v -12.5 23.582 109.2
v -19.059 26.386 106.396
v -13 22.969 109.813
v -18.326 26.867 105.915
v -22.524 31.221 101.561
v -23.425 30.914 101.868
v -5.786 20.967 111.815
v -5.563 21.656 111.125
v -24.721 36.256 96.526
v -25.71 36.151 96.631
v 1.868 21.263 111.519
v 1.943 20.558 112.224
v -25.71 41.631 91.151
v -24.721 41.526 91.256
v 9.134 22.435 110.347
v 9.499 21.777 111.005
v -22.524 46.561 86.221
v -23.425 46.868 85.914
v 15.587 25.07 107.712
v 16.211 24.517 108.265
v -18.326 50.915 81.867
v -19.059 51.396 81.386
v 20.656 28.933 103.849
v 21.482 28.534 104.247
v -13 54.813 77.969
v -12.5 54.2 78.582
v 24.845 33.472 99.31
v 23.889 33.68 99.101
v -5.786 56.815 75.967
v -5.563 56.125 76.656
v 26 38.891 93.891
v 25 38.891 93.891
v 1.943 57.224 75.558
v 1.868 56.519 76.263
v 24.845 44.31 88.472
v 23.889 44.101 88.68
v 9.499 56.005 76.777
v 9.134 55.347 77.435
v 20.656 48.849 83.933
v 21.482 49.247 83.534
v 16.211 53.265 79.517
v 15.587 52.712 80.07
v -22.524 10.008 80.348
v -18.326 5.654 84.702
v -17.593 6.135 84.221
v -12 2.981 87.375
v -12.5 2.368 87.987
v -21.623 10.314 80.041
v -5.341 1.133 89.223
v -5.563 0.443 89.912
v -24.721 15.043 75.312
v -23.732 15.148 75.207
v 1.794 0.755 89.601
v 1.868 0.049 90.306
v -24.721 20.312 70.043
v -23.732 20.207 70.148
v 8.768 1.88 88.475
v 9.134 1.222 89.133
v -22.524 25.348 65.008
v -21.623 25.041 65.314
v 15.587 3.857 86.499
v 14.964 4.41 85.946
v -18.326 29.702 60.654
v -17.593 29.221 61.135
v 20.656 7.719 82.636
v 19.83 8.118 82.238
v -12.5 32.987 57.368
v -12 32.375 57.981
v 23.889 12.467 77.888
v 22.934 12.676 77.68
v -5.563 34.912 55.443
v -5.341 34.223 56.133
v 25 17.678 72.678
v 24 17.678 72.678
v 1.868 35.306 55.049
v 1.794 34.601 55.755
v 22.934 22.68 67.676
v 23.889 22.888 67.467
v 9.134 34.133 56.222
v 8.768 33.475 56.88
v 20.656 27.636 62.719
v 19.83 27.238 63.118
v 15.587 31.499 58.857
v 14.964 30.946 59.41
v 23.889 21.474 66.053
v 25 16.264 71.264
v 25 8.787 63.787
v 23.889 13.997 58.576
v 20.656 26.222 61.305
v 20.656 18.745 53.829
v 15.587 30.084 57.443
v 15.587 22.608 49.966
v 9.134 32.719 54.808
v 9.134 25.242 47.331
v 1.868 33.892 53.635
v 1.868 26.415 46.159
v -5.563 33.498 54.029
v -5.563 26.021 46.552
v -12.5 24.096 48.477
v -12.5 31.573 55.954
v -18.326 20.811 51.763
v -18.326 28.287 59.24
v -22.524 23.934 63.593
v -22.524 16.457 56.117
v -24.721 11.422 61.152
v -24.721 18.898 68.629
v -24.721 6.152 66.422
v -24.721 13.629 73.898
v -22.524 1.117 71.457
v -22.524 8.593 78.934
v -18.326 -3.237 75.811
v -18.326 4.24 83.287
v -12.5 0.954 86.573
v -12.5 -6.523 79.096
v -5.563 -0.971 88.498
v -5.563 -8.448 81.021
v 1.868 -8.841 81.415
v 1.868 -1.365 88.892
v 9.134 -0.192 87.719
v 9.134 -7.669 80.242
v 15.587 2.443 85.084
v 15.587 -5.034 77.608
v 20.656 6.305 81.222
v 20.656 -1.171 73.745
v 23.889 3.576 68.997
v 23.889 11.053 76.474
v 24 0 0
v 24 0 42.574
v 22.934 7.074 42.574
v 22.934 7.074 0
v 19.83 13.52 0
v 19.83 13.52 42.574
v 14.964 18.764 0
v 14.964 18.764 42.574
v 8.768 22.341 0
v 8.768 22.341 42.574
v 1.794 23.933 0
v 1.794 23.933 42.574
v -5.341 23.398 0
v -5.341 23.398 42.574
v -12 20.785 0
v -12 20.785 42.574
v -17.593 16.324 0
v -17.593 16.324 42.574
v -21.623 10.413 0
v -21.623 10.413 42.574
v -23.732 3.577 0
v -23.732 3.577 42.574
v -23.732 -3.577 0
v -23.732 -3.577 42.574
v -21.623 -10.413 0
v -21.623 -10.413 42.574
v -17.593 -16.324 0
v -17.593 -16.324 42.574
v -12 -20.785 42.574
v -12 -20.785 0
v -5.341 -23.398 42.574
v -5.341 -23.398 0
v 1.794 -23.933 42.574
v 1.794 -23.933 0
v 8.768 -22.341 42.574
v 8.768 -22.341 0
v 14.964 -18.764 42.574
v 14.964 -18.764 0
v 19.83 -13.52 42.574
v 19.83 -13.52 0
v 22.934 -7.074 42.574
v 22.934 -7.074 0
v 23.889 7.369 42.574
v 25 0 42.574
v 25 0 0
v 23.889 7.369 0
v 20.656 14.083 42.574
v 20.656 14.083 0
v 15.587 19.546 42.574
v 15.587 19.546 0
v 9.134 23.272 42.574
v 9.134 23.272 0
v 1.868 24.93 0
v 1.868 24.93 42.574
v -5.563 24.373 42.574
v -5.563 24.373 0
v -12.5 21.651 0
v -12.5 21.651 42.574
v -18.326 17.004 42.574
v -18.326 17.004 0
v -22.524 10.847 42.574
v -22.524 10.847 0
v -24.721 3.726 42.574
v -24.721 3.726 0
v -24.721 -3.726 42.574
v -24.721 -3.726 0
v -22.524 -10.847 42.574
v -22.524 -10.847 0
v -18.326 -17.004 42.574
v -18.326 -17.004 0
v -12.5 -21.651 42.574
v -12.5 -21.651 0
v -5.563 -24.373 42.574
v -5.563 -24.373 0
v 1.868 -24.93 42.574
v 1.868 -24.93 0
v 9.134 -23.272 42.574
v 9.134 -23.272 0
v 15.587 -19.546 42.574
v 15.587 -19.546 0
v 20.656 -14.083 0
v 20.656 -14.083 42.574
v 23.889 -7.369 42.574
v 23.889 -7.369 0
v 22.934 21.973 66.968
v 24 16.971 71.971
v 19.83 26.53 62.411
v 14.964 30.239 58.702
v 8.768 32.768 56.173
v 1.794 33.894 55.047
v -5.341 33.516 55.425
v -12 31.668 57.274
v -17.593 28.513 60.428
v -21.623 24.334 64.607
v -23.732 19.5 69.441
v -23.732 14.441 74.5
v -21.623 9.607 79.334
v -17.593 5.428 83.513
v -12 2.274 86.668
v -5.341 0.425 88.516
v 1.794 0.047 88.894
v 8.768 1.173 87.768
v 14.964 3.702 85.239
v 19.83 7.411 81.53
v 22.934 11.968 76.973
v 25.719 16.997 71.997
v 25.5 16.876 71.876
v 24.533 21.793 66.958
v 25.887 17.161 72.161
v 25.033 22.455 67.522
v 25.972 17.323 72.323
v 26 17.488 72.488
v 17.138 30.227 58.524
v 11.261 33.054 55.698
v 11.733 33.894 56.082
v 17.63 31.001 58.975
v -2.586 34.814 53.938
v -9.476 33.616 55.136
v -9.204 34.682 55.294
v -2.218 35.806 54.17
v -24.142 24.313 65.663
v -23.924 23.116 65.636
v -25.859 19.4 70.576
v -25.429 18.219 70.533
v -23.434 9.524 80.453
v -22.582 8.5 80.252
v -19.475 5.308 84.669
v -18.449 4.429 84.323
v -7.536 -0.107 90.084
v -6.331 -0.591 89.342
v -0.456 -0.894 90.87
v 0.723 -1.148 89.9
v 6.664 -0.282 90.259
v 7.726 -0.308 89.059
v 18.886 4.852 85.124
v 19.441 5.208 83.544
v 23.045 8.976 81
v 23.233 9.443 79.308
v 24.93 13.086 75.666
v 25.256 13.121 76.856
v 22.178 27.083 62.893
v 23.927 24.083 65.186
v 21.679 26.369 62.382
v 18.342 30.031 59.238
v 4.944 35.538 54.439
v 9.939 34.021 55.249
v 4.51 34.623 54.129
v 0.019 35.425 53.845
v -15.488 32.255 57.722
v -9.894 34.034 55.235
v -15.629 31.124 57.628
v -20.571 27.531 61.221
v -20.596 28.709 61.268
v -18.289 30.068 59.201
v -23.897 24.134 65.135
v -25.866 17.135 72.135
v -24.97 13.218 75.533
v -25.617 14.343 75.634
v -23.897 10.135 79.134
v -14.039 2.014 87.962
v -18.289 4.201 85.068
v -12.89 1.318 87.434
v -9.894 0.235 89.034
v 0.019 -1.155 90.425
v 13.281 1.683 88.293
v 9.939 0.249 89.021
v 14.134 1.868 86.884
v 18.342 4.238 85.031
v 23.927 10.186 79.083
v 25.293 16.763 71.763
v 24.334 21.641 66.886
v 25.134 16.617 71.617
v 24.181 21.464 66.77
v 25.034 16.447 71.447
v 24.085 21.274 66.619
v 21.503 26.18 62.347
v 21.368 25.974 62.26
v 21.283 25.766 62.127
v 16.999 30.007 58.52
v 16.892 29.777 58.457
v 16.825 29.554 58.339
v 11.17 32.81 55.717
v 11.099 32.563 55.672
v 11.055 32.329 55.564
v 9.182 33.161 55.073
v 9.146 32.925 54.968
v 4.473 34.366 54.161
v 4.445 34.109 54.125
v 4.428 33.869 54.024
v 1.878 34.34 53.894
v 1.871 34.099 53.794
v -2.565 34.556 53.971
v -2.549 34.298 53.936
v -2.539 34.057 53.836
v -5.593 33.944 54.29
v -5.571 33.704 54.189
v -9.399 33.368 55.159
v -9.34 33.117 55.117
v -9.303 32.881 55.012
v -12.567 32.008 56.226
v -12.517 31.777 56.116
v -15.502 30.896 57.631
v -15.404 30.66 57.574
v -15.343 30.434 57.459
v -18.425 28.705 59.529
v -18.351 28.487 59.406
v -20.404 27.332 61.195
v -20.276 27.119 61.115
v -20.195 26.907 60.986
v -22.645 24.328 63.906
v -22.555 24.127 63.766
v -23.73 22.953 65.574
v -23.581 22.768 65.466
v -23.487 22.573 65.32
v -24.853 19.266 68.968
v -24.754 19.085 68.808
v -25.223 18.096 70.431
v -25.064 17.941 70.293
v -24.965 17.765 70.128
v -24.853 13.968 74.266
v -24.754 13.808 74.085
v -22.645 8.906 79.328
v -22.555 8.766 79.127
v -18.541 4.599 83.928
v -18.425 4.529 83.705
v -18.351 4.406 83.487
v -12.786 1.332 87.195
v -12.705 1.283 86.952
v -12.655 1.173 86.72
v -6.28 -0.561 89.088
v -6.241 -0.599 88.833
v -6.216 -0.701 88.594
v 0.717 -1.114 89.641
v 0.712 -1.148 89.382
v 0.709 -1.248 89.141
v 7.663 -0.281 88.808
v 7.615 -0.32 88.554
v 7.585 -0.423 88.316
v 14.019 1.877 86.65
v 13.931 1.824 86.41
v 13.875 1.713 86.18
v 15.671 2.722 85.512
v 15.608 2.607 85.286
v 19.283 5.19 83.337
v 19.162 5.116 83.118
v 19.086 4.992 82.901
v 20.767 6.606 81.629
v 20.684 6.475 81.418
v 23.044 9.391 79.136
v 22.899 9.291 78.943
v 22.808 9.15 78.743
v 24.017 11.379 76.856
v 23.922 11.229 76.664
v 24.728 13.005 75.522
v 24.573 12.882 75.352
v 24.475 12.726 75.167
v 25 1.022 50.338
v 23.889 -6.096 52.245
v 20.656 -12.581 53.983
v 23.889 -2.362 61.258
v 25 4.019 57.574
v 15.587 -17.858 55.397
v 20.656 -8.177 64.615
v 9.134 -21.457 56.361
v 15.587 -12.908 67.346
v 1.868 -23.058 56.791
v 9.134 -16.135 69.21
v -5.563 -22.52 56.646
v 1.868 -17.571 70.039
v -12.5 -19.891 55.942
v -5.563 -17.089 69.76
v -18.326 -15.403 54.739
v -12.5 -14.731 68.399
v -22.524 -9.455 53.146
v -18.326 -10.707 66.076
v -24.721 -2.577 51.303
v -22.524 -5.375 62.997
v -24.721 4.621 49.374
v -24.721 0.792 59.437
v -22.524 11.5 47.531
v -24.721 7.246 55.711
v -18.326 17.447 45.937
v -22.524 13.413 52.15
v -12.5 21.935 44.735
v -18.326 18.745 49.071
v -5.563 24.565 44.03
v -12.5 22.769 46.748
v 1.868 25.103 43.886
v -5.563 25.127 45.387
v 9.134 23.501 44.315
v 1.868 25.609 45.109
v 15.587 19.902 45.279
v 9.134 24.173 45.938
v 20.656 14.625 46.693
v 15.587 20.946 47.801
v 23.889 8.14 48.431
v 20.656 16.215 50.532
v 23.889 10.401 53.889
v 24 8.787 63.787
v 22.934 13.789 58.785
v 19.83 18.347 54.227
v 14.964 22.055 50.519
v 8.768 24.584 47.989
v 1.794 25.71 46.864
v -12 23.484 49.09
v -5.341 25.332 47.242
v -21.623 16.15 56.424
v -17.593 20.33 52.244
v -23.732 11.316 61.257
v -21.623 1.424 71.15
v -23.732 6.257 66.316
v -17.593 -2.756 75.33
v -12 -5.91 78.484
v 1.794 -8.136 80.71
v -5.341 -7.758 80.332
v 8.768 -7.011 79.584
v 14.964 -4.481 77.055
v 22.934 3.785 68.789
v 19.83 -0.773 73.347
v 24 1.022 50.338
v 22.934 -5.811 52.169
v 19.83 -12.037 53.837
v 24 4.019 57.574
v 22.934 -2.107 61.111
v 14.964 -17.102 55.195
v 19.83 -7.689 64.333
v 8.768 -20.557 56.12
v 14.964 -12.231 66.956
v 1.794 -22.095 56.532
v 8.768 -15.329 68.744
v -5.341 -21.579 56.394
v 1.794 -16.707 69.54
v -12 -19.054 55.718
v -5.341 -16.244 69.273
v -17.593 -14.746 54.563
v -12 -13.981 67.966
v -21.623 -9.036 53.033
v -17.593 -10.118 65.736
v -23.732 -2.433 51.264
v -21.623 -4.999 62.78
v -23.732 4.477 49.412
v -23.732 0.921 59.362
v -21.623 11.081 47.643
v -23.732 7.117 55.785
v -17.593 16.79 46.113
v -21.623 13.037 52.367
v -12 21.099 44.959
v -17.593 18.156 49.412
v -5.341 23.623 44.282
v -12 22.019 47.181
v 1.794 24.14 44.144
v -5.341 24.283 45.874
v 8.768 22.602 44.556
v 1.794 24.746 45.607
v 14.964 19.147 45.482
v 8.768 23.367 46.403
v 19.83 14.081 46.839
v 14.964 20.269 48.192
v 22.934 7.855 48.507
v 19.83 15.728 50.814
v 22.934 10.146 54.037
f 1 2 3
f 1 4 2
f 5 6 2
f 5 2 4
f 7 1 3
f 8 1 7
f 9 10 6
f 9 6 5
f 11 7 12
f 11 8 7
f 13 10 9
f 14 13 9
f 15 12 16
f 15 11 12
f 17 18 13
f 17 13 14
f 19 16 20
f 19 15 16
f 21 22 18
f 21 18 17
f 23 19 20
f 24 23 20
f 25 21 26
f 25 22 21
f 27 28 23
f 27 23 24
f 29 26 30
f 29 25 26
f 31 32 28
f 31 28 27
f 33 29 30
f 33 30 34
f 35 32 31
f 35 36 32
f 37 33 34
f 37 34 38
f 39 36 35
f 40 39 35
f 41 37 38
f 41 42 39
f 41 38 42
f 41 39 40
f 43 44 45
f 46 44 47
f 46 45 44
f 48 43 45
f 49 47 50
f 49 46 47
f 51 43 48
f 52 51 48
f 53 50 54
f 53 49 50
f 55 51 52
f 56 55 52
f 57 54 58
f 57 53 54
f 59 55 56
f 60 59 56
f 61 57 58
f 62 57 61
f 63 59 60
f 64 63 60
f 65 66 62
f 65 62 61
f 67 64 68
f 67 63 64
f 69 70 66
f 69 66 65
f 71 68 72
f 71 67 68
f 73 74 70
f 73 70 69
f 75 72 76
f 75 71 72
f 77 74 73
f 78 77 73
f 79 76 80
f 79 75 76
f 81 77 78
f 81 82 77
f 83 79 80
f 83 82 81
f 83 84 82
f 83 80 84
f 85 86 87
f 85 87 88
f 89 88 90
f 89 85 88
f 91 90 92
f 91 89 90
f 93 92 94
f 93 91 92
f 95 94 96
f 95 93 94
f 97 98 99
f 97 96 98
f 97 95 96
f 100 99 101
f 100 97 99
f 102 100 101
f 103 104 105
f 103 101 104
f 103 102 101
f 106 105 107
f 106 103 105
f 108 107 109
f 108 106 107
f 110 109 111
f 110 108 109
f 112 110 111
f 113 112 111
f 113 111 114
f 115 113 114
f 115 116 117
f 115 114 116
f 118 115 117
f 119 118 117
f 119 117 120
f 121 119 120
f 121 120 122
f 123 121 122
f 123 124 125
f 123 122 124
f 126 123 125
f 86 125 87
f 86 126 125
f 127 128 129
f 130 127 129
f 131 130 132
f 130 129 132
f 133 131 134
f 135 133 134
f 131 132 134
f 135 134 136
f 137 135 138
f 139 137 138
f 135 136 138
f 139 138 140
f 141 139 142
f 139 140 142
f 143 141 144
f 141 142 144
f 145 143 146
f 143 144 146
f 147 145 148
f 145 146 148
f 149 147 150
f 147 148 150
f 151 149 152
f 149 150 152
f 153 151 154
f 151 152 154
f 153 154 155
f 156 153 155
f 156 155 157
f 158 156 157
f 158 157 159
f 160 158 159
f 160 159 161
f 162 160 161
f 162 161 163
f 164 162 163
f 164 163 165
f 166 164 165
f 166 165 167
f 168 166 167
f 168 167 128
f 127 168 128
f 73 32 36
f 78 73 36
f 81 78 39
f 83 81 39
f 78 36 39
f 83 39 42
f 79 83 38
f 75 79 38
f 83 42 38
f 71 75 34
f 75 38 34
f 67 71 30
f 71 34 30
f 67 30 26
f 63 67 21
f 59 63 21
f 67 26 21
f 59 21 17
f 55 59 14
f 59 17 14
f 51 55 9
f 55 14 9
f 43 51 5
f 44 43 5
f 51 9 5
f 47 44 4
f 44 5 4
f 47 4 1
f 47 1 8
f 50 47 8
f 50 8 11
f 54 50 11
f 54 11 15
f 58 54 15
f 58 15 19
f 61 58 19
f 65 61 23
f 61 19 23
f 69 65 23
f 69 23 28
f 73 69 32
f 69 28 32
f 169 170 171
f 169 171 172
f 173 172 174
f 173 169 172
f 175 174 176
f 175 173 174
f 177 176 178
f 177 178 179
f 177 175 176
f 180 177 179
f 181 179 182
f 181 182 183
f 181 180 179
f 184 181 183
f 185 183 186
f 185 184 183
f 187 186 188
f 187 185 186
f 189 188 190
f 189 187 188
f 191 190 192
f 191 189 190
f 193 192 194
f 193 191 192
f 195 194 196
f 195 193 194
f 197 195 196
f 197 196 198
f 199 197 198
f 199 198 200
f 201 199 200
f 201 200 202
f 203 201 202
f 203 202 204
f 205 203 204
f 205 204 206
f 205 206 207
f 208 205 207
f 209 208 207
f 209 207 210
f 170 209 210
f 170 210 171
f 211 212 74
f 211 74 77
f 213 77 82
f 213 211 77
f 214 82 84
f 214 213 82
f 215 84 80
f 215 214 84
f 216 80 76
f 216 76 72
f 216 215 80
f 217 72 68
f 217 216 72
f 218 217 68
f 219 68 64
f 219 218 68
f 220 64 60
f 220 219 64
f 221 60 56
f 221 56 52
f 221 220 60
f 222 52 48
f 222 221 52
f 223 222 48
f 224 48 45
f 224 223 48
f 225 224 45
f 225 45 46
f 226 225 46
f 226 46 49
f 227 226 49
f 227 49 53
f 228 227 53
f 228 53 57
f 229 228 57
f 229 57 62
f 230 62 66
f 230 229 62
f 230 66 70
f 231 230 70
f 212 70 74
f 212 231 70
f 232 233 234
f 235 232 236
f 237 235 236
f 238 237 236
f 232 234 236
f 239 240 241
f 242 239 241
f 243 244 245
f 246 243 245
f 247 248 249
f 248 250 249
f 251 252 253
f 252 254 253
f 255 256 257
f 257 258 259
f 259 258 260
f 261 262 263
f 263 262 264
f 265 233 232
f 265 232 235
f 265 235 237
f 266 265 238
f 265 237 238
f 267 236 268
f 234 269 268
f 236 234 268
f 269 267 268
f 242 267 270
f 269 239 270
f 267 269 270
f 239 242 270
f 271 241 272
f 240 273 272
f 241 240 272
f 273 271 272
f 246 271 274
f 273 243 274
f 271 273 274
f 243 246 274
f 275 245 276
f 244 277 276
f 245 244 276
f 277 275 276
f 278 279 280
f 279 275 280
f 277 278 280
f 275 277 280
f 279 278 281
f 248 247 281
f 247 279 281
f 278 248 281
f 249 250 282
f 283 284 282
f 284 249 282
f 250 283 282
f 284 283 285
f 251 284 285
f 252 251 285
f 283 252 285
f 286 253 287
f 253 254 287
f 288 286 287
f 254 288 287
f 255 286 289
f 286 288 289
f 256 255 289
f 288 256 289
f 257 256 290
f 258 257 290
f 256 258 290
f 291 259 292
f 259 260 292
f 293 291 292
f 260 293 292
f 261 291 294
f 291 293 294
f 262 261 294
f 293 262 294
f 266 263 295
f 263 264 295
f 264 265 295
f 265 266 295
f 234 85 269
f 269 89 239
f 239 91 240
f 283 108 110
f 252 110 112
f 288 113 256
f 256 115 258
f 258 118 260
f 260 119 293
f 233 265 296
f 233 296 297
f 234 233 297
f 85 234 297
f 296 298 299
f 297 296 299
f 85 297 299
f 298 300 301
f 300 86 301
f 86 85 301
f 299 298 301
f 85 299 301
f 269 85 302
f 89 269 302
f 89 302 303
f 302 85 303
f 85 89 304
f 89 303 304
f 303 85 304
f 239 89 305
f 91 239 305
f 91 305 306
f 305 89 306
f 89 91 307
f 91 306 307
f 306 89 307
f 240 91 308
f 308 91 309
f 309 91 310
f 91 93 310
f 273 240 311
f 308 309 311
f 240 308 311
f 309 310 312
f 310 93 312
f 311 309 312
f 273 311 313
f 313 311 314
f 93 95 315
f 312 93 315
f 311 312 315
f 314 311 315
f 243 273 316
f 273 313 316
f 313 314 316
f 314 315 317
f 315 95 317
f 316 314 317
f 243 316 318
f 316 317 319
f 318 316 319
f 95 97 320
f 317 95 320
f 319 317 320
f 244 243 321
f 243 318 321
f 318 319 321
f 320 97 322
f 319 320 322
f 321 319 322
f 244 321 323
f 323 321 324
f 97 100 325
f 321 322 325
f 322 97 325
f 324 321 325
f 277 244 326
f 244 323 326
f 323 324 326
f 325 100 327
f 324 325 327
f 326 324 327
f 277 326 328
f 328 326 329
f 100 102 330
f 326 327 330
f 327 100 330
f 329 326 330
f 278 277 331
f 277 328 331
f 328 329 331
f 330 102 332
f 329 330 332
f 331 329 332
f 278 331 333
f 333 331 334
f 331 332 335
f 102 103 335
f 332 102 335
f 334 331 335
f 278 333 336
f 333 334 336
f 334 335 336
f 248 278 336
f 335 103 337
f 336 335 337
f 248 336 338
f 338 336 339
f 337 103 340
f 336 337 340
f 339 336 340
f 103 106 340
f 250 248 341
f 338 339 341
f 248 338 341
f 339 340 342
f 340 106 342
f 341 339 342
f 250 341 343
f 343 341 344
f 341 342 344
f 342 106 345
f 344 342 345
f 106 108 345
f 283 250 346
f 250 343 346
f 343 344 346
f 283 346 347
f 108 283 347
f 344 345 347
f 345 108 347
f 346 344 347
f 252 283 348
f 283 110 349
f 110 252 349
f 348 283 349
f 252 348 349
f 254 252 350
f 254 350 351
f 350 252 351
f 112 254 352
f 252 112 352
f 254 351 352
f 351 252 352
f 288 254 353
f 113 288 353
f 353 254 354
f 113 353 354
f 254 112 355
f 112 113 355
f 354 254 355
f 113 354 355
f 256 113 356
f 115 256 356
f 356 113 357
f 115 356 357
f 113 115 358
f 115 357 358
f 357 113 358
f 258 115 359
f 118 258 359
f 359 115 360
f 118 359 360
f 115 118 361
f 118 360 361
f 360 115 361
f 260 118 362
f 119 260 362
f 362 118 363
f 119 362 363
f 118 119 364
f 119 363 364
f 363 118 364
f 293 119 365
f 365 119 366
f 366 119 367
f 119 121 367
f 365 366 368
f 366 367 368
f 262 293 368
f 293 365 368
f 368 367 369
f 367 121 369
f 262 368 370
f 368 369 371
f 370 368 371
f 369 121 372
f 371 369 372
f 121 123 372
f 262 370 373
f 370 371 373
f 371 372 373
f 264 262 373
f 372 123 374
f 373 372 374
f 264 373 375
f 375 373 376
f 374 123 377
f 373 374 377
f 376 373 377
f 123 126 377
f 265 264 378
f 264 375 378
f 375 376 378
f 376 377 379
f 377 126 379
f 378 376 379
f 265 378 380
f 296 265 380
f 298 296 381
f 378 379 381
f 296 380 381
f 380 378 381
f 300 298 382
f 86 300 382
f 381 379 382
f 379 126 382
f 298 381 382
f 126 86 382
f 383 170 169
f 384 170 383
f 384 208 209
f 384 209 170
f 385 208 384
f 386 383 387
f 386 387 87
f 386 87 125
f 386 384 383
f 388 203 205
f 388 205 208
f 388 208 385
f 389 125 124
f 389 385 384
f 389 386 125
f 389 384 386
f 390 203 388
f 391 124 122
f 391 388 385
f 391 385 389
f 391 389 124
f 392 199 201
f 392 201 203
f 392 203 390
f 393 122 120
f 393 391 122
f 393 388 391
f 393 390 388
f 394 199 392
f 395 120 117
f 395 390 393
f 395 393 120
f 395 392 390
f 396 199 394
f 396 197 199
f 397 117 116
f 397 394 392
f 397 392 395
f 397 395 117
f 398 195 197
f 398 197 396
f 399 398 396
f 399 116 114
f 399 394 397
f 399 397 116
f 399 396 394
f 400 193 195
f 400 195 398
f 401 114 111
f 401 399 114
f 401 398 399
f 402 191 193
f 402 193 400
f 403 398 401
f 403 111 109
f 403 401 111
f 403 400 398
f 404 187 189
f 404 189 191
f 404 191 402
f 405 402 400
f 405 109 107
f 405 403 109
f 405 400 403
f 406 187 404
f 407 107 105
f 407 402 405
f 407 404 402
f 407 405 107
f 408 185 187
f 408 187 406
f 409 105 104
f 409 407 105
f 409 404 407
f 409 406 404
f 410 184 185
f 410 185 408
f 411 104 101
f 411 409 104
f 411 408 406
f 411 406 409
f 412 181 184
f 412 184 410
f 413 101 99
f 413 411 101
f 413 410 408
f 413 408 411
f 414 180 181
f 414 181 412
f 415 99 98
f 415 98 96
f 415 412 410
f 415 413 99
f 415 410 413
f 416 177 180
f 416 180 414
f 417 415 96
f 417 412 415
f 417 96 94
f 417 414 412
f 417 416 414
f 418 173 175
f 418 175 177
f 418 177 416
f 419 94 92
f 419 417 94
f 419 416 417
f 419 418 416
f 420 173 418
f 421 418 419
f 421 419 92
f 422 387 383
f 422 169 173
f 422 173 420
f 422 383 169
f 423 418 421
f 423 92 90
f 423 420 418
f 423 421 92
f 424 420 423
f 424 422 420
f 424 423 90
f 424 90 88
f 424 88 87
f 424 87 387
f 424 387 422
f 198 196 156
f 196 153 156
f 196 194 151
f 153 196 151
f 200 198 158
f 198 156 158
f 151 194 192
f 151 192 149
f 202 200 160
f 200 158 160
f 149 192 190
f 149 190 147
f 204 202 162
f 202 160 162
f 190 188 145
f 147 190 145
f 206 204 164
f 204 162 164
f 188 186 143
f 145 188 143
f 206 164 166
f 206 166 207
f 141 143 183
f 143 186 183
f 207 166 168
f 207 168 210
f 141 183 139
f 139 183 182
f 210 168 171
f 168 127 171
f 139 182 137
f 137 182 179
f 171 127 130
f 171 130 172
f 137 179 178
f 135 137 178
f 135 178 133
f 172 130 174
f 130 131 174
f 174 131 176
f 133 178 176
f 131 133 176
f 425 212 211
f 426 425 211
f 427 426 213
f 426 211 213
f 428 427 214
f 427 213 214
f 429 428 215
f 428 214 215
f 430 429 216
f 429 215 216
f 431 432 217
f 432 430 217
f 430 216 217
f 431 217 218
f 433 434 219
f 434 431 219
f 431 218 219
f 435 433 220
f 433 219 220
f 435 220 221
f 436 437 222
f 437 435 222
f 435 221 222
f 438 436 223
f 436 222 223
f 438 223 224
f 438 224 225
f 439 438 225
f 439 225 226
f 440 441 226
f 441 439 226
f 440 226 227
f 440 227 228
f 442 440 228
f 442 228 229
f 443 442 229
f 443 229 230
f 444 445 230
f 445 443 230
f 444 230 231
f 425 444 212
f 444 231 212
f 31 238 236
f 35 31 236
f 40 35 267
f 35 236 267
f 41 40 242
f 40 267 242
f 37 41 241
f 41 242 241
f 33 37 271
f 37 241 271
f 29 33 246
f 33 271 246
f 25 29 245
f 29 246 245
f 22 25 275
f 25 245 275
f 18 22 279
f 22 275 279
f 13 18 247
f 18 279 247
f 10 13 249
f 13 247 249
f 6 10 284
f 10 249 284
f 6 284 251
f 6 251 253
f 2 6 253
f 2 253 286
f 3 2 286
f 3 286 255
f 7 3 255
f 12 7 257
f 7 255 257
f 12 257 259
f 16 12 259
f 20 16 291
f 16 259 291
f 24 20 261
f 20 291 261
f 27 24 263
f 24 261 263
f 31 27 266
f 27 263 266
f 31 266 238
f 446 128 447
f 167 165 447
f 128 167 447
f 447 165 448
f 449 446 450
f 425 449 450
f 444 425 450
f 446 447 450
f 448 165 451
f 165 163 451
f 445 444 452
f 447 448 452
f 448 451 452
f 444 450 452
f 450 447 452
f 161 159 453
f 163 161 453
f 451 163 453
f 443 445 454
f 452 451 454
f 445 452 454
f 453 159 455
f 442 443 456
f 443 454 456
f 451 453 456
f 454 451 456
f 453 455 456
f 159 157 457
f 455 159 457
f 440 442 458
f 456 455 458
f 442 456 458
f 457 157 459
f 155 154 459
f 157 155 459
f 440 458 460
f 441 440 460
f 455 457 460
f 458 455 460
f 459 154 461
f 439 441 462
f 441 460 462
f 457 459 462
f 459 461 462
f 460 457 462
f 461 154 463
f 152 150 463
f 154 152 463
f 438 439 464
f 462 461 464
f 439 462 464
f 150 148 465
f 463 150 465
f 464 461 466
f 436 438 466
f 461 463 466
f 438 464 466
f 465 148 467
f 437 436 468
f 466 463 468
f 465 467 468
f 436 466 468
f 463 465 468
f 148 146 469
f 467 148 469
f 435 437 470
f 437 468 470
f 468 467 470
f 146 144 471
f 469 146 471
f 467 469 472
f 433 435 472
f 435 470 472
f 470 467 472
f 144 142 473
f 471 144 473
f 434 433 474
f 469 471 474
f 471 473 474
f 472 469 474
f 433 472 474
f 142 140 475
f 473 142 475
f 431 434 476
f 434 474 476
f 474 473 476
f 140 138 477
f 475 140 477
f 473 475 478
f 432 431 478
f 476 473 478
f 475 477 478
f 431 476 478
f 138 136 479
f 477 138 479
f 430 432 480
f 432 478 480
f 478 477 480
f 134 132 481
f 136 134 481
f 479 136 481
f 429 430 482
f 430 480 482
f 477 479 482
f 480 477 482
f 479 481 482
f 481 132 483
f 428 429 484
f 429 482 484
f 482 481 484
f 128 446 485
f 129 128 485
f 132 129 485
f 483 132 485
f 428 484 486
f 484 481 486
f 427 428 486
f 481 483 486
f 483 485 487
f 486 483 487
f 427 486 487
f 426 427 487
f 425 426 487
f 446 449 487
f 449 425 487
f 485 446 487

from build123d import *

# Parameters (mm, degrees)
ESQUISSE6_R        = 25
ESQUISSE6_R_2      = 24
ESQUISSE8_R        = 26
ESQUISSE8_R_2      = 24
EXTRU_MINCE1_DEPTH = 1
EXTRU_MINCE2_START = 30
ESQUISSE9_R        = 26
ESQUISSE9_R_2      = 25
EXTRU_MINCE2_DEPTH = 30
CONG_1_R           = 1
CONG_2_R           = 1


with BuildPart() as part:
    # Balayage-Mince2: sweep along a path in Esquisse7
    with BuildLine(Plane(origin=(0, 0, 0), x_dir=(0, 0, -1), z_dir=(1, 0, 0))) as balayage_mince2_path:
        Line((0, 0), (-42.573593129, 0))
        ThreePointArc((-42.573593129, 0), (-54.0540961, 2.283614025), (-63.786796564, 8.786796564))
        Line((-63.786796564, 8.786796564), (-71.970562748, 16.970562748))
    # Esquisse6 → Balayage-Mince2 (sweep)
    with BuildSketch(Plane.XY):
        Circle(ESQUISSE6_R)
        Circle(ESQUISSE6_R_2, mode=Mode.SUBTRACT)
    sweep(path=balayage_mince2_path.line)



with BuildPart() as body_2:
    # Esquisse8 → Extru.-Mince1 (new body)
    with BuildSketch(Plane(origin=(0, 44.470562748, 44.470562748), x_dir=(1, 0, 0), z_dir=(0, 0.7071067811865487, 0.7071067811865464))):
        with Locations((0, -38.890872965)):
            Circle(ESQUISSE8_R)
        with Locations((0, -38.890872965)):
            Circle(ESQUISSE8_R_2, mode=Mode.SUBTRACT)
    extrude(amount=EXTRU_MINCE1_DEPTH)


with BuildPart() as part_1:
    add(part.part)

    add(body_2.part)  # Extru.-Mince2 merges body 2
    # Esquisse9 → Extru.-Mince2 (add)
    with BuildSketch(Plane(origin=(0, 45.17766953, 45.17766953), x_dir=(1, 0, 0), z_dir=(0, 0.7071067811865487, 0.7071067811865464)).offset(EXTRU_MINCE2_START)):
        with Locations((0, -38.890872965)):
            Circle(ESQUISSE9_R)
        with Locations((0, -38.890872965)):
            Circle(ESQUISSE9_R_2, mode=Mode.SUBTRACT)
    extrude(amount=-EXTRU_MINCE2_DEPTH)

    # Congé1
    cong_1_edges = [part_1.edges().sort_by_distance(p)[0] for p in [
        (-25, 16.970562748, 71.970562748),
    ]]
    fillet(cong_1_edges, radius=CONG_1_R - 0.0001)  # a hair under: the kernel refuses the full size

    # Congé2
    cong_2_edges = [part_1.edges().sort_by_distance(p)[0] for p in [
        (-26, 16.970562748, 71.970562748),
    ]]
    fillet(cong_2_edges, radius=CONG_2_R)


solid = part_1.part
